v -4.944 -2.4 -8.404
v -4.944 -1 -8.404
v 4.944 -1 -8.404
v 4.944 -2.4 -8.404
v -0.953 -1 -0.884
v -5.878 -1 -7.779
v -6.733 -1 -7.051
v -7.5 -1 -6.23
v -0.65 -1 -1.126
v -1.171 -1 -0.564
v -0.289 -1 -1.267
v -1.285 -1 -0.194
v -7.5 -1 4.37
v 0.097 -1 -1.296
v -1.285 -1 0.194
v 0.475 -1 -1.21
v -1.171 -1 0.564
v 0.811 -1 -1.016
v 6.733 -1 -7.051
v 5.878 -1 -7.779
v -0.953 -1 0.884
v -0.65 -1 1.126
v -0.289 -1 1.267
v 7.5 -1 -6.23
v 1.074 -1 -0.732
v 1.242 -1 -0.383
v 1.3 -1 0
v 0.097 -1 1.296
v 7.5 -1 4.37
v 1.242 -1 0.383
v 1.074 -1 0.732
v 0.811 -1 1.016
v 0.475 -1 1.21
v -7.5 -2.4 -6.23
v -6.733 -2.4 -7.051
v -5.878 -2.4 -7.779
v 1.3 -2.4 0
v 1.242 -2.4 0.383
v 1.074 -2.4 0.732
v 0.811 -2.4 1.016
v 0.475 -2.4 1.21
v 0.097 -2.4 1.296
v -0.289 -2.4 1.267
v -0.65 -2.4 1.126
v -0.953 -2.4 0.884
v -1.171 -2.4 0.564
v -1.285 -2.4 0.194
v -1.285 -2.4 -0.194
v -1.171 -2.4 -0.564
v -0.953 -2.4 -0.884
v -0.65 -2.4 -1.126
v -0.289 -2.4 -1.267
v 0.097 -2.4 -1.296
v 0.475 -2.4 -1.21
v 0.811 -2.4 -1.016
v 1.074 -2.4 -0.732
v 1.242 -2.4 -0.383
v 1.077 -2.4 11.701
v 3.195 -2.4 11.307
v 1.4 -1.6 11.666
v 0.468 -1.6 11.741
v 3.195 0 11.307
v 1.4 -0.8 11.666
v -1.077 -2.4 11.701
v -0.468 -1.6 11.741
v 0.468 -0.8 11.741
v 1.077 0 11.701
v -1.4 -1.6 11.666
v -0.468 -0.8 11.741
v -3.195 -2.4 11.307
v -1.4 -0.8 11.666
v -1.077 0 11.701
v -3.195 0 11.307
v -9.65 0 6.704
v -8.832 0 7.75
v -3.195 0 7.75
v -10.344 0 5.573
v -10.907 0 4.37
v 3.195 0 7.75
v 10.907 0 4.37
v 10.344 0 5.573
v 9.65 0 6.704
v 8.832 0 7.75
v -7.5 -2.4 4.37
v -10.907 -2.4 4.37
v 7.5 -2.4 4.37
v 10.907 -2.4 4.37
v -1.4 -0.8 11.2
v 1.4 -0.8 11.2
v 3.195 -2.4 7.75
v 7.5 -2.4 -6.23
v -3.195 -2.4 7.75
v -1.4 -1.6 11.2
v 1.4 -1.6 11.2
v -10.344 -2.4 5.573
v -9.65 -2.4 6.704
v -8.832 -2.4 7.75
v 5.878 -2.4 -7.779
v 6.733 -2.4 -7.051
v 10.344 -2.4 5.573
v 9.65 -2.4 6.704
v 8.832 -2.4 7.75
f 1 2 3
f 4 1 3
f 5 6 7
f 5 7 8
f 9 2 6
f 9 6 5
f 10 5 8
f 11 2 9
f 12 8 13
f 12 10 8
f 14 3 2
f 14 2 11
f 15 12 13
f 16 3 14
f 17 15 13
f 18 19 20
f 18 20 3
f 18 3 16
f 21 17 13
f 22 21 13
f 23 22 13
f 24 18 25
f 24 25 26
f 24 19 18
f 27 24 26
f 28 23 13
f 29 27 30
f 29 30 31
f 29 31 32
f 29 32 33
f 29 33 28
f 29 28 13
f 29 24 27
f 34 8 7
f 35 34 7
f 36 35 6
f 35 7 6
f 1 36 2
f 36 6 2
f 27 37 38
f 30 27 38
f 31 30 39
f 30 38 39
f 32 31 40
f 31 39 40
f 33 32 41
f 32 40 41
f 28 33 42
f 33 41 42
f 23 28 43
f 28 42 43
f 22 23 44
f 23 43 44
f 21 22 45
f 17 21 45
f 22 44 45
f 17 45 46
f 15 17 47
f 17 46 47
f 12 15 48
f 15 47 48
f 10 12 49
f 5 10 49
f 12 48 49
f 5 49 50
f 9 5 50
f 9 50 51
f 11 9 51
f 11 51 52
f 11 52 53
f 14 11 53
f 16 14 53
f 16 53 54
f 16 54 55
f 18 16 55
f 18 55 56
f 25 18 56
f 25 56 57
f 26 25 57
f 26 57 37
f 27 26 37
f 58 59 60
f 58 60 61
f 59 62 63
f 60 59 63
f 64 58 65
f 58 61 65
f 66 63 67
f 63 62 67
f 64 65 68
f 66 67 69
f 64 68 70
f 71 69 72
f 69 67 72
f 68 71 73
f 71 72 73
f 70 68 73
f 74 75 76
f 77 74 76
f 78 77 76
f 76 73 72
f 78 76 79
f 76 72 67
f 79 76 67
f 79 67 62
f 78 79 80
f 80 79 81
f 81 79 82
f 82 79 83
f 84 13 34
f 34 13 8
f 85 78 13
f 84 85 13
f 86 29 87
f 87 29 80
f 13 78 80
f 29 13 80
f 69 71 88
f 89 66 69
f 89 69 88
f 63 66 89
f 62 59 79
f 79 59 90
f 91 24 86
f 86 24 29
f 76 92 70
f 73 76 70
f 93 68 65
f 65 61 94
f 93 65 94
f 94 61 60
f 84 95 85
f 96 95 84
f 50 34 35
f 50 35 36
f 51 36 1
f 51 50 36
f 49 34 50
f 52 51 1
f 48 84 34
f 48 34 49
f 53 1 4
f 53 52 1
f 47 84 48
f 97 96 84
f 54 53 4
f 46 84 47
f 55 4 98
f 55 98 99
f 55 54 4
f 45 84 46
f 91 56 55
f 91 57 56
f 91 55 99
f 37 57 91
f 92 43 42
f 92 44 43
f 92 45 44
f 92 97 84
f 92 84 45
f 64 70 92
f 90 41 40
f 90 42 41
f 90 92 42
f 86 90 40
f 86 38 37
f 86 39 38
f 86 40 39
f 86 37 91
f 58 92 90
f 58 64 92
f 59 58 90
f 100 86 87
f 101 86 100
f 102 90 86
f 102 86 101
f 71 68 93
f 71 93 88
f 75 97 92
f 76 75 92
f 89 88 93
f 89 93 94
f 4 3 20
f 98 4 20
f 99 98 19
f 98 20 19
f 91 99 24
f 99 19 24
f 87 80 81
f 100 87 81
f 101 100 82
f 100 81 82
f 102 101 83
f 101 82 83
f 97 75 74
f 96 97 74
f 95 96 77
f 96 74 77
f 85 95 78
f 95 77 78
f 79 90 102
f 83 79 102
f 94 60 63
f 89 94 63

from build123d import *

# Parameters (mm, degrees)
F1_DEPTH  = 2.4
F2_W      = 1
F2_H      = 15
F3_DEPTH  = 12.5
F5_W      = 2.8
F5_H      = 0.8
F6_DEPTH  = 0.8
F8_DEPTH  = 2.401
F9_R      = 1.3
F10_DEPTH = 2.401


with BuildPart() as f1:
    # F0 (on Front) → F1 (new body)
    with BuildSketch(Plane.XZ):
        with BuildLine():
            Line((-7.5, 4.37), (-7.5, -6.229968))
            ThreePointArc((-7.5, -6.229968), (-6.316015, -7.427682), (-4.943581, -8.403779))
            Line((-4.943581, -8.403779), (4.943581, -8.403779))
            ThreePointArc((4.943581, -8.403779), (6.316015, -7.427682), (7.5, -6.229968))
            Line((7.5, -6.229968), (7.5, 4.37))
            Line((7.5, 4.37), (10.907135, 4.37))
            ThreePointArc((10.907135, 4.37), (0, 11.75), (-10.907135, 4.37))
            Line((-10.907135, 4.37), (-7.5, 4.37))
        make_face()
    extrude(amount=F1_DEPTH)

    # F2 (on Right) → F3 (cut, symmetric)
    with BuildSketch(Plane.YZ):
        with Locations((-0.5, -3.13)):
            Rectangle(F2_W, F2_H)
    extrude(amount=F3_DEPTH, both=True, mode=Mode.SUBTRACT)

    # F5 (on offset) → F6 (cut)
    with BuildSketch(Plane.XY.offset(12)):
        with Locations((0, -1.2)):
            Rectangle(F5_W, F5_H)
    extrude(amount=-F6_DEPTH, mode=Mode.SUBTRACT)

    # F7 (on face) → F8 (cut, through all)
    with BuildSketch(Plane.XZ.offset(2.4)):
        with BuildLine():
            Line((-3.195484, 7.75), (-3.195484, 11.307139))
            ThreePointArc((-3.195484, 11.307139), (-6.271121, 9.936576), (-8.831761, 7.75))
            Line((-8.831761, 7.75), (-3.195484, 7.75))
        make_face()
        with BuildLine():
            Line((3.195484, 7.75), (8.831761, 7.75))
            ThreePointArc((8.831761, 7.75), (6.271121, 9.936576), (3.195484, 11.307139))
            Line((3.195484, 11.307139), (3.195484, 7.75))
        make_face()
    extrude(amount=-F8_DEPTH, mode=Mode.SUBTRACT)

    # F9 (on face) → F10 (cut, through all)
    with BuildSketch(Plane.XZ.offset(2.4)):
        Circle(F9_R)
    extrude(amount=-F10_DEPTH, mode=Mode.SUBTRACT)


solid = f1.part
